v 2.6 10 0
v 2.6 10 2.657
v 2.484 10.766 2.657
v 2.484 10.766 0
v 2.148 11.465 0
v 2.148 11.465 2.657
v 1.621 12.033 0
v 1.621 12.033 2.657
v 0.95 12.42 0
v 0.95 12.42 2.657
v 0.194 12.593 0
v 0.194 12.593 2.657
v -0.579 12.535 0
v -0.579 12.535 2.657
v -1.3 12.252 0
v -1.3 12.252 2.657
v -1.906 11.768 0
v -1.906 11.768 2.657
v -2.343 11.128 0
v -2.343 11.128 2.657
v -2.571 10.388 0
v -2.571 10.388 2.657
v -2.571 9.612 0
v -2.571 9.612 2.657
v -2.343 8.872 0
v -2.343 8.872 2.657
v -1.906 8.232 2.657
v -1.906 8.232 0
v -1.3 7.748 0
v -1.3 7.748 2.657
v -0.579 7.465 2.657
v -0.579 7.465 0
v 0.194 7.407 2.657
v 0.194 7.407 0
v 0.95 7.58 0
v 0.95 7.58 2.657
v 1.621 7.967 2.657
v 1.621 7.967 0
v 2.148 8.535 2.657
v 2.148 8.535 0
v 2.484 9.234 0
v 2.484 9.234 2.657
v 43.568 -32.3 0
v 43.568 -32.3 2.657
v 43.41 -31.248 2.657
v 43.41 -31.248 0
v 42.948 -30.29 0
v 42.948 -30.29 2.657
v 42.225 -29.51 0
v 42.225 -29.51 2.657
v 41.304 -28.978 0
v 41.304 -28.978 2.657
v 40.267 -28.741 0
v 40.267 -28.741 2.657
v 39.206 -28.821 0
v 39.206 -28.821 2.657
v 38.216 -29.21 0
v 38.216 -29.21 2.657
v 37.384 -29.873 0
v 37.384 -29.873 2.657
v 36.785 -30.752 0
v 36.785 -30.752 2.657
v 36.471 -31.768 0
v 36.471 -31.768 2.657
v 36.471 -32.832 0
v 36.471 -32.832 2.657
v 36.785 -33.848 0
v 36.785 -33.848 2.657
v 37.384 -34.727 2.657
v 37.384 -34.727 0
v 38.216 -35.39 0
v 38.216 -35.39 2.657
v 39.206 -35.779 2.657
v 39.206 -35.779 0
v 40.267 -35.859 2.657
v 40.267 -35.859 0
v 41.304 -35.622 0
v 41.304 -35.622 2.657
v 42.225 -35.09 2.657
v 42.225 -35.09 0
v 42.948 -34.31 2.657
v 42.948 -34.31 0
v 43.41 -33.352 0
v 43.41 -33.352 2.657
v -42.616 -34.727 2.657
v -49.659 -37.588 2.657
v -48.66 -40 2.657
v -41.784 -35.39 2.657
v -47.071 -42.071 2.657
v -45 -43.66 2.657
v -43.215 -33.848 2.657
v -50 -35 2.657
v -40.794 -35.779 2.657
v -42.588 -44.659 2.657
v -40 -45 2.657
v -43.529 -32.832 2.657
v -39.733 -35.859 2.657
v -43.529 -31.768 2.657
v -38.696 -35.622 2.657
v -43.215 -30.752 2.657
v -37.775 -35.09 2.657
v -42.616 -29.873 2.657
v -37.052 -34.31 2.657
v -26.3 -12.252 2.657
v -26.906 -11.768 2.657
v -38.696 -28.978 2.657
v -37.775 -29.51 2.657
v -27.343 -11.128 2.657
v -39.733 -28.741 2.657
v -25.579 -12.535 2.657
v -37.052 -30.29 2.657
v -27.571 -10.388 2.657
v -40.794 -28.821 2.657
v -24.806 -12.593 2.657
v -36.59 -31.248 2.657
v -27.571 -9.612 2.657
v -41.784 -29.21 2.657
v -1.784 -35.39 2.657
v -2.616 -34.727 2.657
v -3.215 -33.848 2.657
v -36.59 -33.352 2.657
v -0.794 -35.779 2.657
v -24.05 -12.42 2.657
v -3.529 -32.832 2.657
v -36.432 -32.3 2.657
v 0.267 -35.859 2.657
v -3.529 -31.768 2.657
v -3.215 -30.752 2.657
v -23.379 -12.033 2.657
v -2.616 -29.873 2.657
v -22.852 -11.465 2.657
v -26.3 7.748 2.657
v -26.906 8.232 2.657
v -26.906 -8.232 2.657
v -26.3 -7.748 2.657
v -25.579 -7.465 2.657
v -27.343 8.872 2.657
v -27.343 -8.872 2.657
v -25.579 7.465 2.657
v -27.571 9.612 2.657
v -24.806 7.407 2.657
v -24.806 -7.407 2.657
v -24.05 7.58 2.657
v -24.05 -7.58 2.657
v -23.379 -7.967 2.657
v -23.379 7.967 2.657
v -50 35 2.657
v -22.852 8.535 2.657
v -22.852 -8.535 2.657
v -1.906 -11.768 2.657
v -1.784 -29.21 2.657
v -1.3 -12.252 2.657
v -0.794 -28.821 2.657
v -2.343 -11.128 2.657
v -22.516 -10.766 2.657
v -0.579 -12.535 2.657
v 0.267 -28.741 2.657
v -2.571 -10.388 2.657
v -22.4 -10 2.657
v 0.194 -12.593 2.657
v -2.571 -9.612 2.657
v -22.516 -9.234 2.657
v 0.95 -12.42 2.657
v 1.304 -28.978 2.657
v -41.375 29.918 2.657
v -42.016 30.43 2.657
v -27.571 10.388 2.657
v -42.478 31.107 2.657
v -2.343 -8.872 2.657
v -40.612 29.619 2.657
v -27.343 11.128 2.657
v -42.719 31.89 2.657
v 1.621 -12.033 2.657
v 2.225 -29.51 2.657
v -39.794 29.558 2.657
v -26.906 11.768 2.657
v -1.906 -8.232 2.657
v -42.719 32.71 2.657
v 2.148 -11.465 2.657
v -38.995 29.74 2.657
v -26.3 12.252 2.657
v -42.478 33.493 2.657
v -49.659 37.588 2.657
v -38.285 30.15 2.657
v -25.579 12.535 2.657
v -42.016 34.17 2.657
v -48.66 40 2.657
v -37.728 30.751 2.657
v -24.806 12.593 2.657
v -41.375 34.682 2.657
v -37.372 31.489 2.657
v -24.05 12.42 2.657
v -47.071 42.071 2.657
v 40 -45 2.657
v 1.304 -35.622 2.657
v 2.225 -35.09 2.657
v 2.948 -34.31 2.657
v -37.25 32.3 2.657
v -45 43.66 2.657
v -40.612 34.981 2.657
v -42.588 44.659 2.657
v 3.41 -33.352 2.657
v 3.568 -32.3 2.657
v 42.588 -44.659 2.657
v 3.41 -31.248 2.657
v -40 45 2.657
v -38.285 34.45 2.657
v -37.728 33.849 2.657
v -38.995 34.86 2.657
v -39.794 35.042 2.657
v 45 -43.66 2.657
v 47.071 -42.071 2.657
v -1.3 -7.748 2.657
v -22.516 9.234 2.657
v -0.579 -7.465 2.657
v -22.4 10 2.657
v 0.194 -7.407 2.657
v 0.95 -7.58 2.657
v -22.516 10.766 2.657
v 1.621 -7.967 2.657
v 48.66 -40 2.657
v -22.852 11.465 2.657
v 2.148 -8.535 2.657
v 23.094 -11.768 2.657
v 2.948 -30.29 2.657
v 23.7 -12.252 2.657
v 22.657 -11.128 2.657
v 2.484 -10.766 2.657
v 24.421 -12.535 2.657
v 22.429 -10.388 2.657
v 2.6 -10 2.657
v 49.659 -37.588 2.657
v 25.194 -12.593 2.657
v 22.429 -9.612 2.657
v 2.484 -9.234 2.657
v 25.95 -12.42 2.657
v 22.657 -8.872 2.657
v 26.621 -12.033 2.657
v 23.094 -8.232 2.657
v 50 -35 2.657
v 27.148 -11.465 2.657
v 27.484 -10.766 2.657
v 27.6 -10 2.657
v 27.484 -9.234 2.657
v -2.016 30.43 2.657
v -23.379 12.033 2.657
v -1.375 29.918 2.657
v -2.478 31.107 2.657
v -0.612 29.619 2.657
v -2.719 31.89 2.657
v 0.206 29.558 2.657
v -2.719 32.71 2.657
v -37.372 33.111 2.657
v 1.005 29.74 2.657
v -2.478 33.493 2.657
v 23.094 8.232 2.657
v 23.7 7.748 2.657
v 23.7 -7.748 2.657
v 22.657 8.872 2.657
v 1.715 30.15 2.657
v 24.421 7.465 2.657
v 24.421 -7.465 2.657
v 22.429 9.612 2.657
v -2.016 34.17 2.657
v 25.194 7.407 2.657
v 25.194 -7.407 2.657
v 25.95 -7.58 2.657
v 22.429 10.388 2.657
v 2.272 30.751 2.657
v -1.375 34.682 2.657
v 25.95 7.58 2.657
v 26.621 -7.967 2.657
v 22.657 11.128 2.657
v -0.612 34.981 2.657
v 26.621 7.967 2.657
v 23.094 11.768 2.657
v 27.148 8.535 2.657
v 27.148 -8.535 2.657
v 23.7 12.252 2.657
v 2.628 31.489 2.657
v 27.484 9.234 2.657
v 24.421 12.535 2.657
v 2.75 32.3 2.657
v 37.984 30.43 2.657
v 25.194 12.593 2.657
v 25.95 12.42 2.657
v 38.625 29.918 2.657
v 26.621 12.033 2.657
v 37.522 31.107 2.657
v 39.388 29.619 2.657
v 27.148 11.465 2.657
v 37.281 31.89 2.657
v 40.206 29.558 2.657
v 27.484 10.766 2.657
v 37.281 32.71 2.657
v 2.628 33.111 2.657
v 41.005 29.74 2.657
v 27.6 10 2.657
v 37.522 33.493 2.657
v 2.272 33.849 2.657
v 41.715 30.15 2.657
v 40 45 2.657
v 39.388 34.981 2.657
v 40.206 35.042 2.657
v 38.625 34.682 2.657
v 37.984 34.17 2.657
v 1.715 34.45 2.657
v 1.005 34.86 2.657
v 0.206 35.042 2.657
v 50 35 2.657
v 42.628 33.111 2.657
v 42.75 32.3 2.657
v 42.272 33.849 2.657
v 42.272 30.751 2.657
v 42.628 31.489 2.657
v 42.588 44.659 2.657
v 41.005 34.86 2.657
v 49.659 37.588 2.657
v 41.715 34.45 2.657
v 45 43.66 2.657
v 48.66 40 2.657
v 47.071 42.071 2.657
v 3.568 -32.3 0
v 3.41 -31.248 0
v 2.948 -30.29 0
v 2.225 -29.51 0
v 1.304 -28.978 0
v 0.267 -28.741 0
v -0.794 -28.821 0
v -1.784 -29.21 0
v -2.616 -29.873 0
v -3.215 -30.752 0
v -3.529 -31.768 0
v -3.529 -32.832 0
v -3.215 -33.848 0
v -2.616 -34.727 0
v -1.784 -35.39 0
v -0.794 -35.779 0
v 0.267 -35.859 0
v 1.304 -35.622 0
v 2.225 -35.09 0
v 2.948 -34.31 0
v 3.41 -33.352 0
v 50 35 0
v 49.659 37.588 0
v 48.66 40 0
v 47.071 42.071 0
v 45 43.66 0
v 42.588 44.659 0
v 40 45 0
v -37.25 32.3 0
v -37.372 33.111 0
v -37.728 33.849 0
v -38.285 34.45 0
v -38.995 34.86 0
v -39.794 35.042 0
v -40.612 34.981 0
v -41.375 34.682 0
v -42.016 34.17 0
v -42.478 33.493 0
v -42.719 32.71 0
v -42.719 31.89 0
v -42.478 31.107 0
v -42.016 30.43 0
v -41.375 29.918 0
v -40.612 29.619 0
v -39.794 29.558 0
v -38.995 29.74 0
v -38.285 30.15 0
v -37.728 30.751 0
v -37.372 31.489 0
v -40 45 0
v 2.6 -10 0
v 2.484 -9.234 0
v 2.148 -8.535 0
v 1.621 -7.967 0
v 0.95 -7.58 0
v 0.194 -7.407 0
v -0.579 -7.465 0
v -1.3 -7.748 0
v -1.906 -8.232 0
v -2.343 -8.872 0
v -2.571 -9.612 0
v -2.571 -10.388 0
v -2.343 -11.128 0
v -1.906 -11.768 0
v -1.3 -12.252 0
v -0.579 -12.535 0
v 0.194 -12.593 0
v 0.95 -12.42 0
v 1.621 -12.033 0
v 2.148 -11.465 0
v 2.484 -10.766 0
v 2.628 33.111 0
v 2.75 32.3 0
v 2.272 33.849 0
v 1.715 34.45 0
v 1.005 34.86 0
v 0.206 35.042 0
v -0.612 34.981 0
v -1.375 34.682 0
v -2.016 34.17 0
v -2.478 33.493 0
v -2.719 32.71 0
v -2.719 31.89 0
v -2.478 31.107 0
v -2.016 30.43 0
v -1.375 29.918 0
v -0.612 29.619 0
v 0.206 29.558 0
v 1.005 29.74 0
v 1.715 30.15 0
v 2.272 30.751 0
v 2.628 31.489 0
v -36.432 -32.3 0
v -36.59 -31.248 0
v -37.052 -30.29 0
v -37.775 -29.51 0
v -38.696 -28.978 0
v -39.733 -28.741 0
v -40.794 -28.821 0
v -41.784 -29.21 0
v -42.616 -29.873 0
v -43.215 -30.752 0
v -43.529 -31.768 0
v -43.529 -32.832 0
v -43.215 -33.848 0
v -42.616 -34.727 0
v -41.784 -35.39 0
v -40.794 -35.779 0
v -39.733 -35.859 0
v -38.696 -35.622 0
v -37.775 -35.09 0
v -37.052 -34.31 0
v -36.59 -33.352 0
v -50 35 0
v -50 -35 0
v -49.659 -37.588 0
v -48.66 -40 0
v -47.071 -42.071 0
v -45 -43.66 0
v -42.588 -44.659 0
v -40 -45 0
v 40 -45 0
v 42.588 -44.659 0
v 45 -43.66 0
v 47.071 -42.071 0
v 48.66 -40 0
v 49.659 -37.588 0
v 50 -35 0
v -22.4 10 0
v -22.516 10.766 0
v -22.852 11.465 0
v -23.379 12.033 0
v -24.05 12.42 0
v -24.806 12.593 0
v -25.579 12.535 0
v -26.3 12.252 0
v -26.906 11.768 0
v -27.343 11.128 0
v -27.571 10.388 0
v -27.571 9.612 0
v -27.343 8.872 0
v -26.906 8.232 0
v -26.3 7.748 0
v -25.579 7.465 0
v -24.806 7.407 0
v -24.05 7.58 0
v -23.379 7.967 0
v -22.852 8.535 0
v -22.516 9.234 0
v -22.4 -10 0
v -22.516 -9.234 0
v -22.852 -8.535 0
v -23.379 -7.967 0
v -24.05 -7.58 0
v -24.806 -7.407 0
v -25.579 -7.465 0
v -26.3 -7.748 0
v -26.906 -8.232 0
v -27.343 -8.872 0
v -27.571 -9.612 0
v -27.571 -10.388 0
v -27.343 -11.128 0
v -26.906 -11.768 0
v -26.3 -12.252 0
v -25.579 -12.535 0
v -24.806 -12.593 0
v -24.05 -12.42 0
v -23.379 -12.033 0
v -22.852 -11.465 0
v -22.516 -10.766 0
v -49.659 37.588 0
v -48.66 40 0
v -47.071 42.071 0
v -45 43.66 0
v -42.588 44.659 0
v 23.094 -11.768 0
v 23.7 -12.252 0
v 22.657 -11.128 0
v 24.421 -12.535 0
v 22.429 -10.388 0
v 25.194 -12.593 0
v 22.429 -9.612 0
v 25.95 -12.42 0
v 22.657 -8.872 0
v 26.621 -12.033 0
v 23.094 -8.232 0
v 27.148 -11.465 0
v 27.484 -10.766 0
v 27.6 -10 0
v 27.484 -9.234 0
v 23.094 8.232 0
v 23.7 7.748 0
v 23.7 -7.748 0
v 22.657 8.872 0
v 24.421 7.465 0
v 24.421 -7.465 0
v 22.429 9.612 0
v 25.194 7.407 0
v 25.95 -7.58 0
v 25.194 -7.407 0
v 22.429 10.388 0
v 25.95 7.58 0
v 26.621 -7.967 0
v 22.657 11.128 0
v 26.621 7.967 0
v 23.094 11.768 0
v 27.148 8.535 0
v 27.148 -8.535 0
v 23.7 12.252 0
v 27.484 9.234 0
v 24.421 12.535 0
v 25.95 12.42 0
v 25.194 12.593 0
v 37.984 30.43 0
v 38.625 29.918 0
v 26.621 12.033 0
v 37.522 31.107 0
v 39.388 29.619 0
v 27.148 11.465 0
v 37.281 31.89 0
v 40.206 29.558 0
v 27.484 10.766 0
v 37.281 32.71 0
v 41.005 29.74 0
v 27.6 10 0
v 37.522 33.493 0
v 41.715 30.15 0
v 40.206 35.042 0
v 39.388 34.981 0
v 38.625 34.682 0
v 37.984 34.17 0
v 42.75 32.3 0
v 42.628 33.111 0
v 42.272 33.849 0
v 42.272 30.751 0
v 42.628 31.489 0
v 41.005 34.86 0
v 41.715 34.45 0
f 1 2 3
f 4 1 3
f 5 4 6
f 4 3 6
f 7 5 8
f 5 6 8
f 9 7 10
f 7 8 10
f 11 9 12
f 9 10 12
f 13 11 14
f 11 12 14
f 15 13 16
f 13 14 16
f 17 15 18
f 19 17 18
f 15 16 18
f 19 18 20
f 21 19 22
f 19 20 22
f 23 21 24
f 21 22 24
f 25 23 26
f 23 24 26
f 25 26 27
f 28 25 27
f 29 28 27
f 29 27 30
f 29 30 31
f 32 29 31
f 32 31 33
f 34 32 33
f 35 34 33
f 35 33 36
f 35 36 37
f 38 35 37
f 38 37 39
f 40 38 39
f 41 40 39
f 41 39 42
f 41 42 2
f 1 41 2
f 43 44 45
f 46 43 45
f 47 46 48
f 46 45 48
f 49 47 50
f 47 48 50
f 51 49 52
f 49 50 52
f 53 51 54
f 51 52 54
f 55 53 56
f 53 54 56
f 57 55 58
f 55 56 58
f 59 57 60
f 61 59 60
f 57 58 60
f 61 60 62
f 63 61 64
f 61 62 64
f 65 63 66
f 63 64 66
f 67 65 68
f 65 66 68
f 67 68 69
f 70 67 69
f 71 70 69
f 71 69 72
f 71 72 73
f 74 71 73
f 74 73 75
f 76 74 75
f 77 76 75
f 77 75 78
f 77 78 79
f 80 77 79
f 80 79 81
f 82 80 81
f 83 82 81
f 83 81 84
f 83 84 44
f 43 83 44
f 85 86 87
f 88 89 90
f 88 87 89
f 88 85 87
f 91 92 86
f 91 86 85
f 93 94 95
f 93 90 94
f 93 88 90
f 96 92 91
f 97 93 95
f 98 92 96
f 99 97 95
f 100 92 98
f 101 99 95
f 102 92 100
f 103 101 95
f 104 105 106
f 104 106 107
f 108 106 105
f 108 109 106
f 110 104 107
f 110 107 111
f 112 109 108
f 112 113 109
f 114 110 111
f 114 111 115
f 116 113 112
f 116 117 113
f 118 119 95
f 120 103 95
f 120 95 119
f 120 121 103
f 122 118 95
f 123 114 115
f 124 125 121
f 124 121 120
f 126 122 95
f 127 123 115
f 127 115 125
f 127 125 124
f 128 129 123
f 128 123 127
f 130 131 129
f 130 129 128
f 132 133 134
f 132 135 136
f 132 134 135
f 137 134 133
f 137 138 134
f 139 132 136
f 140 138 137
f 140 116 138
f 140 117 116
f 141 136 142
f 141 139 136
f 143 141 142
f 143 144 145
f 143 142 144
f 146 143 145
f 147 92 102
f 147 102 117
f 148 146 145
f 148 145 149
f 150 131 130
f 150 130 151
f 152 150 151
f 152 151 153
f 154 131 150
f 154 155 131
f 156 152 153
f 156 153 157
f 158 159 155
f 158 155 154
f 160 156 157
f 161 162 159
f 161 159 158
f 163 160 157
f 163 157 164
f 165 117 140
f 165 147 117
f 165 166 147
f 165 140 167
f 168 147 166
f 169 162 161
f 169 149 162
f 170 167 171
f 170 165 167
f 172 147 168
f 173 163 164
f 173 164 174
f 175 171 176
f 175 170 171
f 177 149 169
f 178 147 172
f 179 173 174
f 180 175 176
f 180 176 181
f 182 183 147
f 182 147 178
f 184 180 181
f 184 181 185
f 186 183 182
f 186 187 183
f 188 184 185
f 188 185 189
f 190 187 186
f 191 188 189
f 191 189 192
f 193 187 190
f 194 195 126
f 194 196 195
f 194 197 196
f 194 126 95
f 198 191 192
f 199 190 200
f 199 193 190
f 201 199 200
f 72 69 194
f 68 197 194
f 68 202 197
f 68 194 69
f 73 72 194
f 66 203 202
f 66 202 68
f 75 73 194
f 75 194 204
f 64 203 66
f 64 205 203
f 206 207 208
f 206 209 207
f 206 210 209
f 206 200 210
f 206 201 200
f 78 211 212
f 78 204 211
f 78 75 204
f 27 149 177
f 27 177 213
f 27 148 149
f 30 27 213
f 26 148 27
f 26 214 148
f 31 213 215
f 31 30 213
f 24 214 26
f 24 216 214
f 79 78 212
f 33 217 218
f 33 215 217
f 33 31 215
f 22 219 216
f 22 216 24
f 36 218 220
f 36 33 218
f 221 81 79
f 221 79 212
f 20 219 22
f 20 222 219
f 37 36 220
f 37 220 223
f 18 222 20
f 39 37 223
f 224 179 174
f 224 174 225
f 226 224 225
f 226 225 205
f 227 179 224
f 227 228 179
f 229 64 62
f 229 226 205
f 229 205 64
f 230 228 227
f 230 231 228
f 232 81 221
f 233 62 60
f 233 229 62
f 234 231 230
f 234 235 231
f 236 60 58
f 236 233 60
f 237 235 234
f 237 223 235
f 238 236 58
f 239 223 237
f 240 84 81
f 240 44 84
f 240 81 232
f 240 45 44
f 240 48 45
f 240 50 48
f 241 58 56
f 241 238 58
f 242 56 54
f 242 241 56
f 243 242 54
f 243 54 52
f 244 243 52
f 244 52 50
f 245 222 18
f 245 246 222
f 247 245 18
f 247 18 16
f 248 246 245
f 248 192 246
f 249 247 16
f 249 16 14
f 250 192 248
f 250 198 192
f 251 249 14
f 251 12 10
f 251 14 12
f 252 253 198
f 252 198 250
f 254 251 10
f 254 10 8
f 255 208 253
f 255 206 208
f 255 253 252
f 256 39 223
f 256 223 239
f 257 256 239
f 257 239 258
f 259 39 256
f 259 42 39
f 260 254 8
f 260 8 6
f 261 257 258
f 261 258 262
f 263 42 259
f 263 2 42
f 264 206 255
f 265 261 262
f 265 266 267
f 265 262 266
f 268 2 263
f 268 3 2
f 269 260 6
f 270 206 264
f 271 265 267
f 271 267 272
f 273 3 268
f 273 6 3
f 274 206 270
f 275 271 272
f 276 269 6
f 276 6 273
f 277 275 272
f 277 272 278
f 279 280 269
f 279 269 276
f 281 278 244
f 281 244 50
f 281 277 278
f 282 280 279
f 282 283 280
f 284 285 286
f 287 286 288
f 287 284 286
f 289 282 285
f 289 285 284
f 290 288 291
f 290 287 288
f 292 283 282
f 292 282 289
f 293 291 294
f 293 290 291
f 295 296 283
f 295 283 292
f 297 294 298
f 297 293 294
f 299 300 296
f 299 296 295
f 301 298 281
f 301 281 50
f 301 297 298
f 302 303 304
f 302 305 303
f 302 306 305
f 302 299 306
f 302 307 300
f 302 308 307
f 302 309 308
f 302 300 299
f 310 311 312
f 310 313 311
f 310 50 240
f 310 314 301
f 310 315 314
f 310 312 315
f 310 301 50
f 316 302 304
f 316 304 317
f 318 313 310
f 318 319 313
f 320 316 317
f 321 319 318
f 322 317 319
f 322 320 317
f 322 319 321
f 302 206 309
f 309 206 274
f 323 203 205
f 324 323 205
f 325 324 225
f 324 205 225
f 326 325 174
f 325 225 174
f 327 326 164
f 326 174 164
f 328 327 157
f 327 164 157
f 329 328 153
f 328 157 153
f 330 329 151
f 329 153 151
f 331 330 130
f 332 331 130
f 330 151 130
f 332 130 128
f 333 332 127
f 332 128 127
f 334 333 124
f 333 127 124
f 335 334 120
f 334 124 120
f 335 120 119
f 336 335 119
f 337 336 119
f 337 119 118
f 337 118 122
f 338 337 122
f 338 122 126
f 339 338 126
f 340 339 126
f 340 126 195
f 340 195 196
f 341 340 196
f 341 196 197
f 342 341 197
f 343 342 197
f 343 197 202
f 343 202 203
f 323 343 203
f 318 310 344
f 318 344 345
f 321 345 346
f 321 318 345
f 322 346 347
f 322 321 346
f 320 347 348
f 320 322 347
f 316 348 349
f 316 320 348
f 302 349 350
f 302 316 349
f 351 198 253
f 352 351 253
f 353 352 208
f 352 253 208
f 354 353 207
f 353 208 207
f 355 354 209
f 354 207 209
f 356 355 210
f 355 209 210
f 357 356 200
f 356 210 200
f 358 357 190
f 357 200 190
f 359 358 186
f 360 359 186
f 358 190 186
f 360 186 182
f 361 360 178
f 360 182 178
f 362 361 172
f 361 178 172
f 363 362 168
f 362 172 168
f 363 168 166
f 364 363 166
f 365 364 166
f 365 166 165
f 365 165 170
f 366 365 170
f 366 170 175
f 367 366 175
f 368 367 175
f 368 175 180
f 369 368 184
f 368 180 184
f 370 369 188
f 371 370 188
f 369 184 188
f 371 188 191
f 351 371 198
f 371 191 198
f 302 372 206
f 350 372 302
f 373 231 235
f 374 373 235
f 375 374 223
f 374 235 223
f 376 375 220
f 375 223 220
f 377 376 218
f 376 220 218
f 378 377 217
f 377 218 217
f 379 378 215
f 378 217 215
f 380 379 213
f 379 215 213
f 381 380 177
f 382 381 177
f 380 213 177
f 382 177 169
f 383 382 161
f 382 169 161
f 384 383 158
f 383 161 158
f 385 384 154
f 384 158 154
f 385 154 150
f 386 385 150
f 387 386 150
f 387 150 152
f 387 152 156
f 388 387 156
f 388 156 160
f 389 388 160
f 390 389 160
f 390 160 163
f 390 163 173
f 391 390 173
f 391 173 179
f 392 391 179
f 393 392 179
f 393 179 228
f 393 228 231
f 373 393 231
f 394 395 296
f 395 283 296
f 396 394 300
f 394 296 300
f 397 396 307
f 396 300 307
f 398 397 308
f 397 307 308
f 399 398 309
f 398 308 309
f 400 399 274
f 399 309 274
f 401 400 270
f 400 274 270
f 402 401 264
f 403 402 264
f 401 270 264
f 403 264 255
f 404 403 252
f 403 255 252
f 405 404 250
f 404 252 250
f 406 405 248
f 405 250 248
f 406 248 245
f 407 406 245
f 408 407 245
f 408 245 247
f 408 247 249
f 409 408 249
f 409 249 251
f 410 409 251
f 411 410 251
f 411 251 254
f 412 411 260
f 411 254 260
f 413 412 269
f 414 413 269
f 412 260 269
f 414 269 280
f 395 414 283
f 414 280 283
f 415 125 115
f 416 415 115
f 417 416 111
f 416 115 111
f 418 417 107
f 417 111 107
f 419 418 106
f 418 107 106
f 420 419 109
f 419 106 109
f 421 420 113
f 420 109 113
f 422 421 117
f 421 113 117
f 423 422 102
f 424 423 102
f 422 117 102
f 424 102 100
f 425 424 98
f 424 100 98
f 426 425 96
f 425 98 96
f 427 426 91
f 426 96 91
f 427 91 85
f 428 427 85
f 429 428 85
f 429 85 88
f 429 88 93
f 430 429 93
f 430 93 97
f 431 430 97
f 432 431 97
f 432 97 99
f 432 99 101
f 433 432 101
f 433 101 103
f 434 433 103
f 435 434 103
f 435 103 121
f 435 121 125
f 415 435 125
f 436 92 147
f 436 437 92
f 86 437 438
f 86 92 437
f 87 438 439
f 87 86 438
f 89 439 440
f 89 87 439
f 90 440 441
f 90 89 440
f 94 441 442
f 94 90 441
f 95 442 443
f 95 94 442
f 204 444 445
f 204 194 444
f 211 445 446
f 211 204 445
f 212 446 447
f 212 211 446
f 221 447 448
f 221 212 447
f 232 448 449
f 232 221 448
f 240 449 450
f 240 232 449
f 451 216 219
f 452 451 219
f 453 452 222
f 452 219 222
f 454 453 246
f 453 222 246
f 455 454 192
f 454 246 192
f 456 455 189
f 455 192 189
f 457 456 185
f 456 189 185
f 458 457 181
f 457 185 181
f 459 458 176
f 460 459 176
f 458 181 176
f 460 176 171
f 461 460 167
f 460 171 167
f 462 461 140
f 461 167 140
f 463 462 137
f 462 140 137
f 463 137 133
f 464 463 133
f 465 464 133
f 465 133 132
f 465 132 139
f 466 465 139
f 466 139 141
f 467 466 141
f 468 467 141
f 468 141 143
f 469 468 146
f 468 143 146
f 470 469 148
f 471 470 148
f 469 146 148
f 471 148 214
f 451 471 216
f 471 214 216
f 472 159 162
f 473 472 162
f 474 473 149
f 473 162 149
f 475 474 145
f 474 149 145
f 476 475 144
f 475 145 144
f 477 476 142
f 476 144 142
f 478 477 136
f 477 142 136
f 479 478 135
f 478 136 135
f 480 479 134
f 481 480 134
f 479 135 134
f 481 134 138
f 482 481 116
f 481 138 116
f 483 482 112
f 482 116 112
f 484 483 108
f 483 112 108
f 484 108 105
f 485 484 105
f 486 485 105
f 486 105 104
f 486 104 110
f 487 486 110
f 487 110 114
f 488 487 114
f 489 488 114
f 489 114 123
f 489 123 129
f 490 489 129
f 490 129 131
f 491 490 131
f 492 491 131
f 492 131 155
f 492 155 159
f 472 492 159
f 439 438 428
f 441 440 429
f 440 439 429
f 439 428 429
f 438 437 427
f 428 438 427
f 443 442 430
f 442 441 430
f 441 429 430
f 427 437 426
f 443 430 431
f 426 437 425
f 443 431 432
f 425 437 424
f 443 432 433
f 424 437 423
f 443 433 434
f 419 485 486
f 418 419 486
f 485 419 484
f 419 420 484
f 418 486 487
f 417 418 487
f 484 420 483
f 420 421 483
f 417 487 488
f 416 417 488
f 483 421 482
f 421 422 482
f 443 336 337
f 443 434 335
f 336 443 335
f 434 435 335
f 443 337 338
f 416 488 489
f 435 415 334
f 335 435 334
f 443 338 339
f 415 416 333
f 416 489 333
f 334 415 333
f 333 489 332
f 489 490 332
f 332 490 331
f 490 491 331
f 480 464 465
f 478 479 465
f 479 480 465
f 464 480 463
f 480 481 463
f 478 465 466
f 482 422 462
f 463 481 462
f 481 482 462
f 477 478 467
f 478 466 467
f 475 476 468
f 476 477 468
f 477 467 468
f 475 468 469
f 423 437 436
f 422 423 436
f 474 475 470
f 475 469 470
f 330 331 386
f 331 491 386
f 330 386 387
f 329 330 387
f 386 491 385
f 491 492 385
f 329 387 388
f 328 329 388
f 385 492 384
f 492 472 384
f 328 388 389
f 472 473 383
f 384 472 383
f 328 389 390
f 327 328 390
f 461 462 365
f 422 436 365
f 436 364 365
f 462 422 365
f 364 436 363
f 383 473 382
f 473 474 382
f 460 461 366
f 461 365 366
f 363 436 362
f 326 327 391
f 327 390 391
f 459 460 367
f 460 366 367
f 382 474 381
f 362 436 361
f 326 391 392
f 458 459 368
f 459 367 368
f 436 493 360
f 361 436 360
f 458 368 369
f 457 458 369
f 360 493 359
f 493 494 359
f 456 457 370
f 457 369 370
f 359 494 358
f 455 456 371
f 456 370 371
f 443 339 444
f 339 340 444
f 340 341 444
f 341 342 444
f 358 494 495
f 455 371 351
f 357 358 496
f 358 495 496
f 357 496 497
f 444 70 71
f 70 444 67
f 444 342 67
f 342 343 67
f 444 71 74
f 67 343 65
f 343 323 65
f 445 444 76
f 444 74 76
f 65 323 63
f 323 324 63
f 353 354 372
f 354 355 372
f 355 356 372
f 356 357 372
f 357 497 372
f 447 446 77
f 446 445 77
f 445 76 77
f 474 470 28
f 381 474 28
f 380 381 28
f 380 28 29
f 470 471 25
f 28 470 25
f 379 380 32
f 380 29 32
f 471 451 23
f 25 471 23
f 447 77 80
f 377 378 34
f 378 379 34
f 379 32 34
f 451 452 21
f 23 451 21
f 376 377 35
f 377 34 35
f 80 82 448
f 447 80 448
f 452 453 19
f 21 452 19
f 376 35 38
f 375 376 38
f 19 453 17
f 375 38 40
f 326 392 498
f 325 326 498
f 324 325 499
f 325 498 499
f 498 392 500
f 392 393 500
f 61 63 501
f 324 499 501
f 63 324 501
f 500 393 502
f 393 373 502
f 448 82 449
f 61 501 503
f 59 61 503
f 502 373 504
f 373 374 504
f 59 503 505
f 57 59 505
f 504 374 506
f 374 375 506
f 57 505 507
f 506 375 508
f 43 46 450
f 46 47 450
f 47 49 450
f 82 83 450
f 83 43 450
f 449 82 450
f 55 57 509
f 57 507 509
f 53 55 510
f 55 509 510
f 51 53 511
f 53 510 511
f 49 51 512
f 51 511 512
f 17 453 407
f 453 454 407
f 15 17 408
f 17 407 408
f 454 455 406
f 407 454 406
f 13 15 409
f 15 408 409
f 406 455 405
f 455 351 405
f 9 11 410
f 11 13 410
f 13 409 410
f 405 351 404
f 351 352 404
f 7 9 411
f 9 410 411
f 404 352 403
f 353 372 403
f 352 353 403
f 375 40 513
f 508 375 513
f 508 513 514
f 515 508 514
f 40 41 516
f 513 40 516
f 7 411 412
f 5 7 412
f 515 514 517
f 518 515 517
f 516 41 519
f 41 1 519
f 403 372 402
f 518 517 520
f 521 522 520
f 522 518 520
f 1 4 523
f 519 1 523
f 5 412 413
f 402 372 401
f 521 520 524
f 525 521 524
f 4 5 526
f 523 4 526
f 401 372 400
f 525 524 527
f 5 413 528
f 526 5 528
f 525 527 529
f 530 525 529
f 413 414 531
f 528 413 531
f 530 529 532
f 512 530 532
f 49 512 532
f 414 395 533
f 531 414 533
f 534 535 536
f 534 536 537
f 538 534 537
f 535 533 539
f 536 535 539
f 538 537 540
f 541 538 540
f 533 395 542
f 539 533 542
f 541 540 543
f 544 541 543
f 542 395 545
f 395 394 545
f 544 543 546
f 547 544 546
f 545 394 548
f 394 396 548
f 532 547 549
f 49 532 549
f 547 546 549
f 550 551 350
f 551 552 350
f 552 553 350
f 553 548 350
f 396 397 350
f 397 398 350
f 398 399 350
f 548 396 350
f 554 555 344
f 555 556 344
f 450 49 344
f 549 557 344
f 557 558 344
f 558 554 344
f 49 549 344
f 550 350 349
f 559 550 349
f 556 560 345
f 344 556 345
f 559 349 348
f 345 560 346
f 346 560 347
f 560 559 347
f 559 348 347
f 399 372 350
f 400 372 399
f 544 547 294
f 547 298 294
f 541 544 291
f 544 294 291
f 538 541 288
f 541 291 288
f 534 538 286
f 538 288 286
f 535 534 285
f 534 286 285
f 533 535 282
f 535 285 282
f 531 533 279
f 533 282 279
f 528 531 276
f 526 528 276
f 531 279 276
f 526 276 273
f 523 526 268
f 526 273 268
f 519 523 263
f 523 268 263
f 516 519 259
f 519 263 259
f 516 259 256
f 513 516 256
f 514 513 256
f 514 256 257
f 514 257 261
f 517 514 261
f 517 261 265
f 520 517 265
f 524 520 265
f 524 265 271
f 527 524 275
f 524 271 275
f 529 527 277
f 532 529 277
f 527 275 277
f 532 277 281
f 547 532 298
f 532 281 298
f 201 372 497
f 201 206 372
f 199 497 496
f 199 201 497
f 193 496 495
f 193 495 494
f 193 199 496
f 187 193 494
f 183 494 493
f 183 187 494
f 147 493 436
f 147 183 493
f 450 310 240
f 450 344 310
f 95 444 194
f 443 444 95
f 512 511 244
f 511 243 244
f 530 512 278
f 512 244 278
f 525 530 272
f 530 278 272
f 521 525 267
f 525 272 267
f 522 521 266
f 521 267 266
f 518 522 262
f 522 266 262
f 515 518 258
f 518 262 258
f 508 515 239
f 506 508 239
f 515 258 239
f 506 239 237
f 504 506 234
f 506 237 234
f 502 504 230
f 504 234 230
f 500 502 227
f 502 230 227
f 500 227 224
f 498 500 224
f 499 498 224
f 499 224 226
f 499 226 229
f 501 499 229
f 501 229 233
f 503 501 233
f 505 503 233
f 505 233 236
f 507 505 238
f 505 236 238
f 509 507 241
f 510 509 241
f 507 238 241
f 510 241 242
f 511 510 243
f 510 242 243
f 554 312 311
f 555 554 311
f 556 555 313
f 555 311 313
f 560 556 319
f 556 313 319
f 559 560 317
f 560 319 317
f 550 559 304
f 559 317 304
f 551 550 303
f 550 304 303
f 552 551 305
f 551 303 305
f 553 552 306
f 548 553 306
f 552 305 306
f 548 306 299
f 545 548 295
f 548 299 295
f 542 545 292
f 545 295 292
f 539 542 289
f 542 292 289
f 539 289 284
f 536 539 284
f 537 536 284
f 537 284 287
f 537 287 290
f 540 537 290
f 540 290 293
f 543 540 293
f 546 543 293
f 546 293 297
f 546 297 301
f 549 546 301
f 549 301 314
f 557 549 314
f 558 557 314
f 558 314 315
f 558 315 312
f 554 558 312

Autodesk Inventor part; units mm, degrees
ref_plane "YZ Plane" through (0, 0, 0) normal (1, 0, 0) x (0, 1, 0)
ref_plane "XZ Plane" through (0, 0, 0) normal (0, 1, 0) x (-1, 0, 0)
ref_plane "XY Plane" through (0, 0, 0) normal (0, 0, 1) x (1, 0, 0)
sketch "Sketch1" plane through (0, 0, 0) normal (0, 0, 1) x (1, 0, 0)
  line L0 (-50, 45) -> (50, 45)
  line L1 (50, 45) -> (50, -45)
  line L2 (50, -45) -> (-50, -45)
  line L3 (-50, -45) -> (-50, 45)
  point P0 (0, 0)
  dimension "d0" = 100
  dimension "d1" = 90
  dimension "d2" = 50
  dimension "d3" = 45
extrude "Extrusion1" add sketch "Sketch1" along normal blind 2.6568
fillet "Fillet1" radius 10 4 edges at (50, 45, 1.3284) (-50, 45, 1.3284) (50, -45, 1.3284) (-50, -45, 1.3284)
sketch "Sketch2" plane through (0, 0, 2.6568) normal (0, 0, 1) x (1, 0, 0)
  line L0 (50, 35) -> (50, -35) projected
  line L1 (-40, 45) -> (40, 45) projected
  circle A0 centre (40, 32.3) radius 2.75
  circle A1 centre (40, -32.3) radius 3.5685
  point P0 (0, 0)
  dimension "d7" = 5.5
  dimension "d8" = 10
  dimension "d10" = 7.137
  dimension "d12" = 10
  dimension "d52" = 64.6
  dimension "d53" = 12.7
extrude "Extrusion2" cut sketch "Sketch2" against normal through all
pattern_linear "Rectangular Pattern1" count 3 spacing 40 along (-1, 0, 0) of "Extrusion2"
sketch "Sketch3" plane through (0, 0, 2.6568) normal (0, 0, 1) x (1, 0, 0)
  line L0 (40, -45) -> (-40, -45) projected
  line L1 (-50, -35) -> (-50, 35) projected
  circle A0 centre (-25, -10) radius 2.6
  point P0 (0, 0)
  dimension "d18" = 5.2
  dimension "d19" = 25
  dimension "d20" = 35
extrude "Extrusion3" cut sketch "Sketch3" against normal through all
pattern_linear "Rectangular Pattern2" count 3 spacing 25 along (1, 0, 0) count 2 spacing 20 along (0, 1, 0) of "Extrusion3"
equation "\"d2\" = 0.5 * d0"
equation "\"d3\" = 0.5 * d1"
properties part number "S2SM-01" material "Steel, Mild"
